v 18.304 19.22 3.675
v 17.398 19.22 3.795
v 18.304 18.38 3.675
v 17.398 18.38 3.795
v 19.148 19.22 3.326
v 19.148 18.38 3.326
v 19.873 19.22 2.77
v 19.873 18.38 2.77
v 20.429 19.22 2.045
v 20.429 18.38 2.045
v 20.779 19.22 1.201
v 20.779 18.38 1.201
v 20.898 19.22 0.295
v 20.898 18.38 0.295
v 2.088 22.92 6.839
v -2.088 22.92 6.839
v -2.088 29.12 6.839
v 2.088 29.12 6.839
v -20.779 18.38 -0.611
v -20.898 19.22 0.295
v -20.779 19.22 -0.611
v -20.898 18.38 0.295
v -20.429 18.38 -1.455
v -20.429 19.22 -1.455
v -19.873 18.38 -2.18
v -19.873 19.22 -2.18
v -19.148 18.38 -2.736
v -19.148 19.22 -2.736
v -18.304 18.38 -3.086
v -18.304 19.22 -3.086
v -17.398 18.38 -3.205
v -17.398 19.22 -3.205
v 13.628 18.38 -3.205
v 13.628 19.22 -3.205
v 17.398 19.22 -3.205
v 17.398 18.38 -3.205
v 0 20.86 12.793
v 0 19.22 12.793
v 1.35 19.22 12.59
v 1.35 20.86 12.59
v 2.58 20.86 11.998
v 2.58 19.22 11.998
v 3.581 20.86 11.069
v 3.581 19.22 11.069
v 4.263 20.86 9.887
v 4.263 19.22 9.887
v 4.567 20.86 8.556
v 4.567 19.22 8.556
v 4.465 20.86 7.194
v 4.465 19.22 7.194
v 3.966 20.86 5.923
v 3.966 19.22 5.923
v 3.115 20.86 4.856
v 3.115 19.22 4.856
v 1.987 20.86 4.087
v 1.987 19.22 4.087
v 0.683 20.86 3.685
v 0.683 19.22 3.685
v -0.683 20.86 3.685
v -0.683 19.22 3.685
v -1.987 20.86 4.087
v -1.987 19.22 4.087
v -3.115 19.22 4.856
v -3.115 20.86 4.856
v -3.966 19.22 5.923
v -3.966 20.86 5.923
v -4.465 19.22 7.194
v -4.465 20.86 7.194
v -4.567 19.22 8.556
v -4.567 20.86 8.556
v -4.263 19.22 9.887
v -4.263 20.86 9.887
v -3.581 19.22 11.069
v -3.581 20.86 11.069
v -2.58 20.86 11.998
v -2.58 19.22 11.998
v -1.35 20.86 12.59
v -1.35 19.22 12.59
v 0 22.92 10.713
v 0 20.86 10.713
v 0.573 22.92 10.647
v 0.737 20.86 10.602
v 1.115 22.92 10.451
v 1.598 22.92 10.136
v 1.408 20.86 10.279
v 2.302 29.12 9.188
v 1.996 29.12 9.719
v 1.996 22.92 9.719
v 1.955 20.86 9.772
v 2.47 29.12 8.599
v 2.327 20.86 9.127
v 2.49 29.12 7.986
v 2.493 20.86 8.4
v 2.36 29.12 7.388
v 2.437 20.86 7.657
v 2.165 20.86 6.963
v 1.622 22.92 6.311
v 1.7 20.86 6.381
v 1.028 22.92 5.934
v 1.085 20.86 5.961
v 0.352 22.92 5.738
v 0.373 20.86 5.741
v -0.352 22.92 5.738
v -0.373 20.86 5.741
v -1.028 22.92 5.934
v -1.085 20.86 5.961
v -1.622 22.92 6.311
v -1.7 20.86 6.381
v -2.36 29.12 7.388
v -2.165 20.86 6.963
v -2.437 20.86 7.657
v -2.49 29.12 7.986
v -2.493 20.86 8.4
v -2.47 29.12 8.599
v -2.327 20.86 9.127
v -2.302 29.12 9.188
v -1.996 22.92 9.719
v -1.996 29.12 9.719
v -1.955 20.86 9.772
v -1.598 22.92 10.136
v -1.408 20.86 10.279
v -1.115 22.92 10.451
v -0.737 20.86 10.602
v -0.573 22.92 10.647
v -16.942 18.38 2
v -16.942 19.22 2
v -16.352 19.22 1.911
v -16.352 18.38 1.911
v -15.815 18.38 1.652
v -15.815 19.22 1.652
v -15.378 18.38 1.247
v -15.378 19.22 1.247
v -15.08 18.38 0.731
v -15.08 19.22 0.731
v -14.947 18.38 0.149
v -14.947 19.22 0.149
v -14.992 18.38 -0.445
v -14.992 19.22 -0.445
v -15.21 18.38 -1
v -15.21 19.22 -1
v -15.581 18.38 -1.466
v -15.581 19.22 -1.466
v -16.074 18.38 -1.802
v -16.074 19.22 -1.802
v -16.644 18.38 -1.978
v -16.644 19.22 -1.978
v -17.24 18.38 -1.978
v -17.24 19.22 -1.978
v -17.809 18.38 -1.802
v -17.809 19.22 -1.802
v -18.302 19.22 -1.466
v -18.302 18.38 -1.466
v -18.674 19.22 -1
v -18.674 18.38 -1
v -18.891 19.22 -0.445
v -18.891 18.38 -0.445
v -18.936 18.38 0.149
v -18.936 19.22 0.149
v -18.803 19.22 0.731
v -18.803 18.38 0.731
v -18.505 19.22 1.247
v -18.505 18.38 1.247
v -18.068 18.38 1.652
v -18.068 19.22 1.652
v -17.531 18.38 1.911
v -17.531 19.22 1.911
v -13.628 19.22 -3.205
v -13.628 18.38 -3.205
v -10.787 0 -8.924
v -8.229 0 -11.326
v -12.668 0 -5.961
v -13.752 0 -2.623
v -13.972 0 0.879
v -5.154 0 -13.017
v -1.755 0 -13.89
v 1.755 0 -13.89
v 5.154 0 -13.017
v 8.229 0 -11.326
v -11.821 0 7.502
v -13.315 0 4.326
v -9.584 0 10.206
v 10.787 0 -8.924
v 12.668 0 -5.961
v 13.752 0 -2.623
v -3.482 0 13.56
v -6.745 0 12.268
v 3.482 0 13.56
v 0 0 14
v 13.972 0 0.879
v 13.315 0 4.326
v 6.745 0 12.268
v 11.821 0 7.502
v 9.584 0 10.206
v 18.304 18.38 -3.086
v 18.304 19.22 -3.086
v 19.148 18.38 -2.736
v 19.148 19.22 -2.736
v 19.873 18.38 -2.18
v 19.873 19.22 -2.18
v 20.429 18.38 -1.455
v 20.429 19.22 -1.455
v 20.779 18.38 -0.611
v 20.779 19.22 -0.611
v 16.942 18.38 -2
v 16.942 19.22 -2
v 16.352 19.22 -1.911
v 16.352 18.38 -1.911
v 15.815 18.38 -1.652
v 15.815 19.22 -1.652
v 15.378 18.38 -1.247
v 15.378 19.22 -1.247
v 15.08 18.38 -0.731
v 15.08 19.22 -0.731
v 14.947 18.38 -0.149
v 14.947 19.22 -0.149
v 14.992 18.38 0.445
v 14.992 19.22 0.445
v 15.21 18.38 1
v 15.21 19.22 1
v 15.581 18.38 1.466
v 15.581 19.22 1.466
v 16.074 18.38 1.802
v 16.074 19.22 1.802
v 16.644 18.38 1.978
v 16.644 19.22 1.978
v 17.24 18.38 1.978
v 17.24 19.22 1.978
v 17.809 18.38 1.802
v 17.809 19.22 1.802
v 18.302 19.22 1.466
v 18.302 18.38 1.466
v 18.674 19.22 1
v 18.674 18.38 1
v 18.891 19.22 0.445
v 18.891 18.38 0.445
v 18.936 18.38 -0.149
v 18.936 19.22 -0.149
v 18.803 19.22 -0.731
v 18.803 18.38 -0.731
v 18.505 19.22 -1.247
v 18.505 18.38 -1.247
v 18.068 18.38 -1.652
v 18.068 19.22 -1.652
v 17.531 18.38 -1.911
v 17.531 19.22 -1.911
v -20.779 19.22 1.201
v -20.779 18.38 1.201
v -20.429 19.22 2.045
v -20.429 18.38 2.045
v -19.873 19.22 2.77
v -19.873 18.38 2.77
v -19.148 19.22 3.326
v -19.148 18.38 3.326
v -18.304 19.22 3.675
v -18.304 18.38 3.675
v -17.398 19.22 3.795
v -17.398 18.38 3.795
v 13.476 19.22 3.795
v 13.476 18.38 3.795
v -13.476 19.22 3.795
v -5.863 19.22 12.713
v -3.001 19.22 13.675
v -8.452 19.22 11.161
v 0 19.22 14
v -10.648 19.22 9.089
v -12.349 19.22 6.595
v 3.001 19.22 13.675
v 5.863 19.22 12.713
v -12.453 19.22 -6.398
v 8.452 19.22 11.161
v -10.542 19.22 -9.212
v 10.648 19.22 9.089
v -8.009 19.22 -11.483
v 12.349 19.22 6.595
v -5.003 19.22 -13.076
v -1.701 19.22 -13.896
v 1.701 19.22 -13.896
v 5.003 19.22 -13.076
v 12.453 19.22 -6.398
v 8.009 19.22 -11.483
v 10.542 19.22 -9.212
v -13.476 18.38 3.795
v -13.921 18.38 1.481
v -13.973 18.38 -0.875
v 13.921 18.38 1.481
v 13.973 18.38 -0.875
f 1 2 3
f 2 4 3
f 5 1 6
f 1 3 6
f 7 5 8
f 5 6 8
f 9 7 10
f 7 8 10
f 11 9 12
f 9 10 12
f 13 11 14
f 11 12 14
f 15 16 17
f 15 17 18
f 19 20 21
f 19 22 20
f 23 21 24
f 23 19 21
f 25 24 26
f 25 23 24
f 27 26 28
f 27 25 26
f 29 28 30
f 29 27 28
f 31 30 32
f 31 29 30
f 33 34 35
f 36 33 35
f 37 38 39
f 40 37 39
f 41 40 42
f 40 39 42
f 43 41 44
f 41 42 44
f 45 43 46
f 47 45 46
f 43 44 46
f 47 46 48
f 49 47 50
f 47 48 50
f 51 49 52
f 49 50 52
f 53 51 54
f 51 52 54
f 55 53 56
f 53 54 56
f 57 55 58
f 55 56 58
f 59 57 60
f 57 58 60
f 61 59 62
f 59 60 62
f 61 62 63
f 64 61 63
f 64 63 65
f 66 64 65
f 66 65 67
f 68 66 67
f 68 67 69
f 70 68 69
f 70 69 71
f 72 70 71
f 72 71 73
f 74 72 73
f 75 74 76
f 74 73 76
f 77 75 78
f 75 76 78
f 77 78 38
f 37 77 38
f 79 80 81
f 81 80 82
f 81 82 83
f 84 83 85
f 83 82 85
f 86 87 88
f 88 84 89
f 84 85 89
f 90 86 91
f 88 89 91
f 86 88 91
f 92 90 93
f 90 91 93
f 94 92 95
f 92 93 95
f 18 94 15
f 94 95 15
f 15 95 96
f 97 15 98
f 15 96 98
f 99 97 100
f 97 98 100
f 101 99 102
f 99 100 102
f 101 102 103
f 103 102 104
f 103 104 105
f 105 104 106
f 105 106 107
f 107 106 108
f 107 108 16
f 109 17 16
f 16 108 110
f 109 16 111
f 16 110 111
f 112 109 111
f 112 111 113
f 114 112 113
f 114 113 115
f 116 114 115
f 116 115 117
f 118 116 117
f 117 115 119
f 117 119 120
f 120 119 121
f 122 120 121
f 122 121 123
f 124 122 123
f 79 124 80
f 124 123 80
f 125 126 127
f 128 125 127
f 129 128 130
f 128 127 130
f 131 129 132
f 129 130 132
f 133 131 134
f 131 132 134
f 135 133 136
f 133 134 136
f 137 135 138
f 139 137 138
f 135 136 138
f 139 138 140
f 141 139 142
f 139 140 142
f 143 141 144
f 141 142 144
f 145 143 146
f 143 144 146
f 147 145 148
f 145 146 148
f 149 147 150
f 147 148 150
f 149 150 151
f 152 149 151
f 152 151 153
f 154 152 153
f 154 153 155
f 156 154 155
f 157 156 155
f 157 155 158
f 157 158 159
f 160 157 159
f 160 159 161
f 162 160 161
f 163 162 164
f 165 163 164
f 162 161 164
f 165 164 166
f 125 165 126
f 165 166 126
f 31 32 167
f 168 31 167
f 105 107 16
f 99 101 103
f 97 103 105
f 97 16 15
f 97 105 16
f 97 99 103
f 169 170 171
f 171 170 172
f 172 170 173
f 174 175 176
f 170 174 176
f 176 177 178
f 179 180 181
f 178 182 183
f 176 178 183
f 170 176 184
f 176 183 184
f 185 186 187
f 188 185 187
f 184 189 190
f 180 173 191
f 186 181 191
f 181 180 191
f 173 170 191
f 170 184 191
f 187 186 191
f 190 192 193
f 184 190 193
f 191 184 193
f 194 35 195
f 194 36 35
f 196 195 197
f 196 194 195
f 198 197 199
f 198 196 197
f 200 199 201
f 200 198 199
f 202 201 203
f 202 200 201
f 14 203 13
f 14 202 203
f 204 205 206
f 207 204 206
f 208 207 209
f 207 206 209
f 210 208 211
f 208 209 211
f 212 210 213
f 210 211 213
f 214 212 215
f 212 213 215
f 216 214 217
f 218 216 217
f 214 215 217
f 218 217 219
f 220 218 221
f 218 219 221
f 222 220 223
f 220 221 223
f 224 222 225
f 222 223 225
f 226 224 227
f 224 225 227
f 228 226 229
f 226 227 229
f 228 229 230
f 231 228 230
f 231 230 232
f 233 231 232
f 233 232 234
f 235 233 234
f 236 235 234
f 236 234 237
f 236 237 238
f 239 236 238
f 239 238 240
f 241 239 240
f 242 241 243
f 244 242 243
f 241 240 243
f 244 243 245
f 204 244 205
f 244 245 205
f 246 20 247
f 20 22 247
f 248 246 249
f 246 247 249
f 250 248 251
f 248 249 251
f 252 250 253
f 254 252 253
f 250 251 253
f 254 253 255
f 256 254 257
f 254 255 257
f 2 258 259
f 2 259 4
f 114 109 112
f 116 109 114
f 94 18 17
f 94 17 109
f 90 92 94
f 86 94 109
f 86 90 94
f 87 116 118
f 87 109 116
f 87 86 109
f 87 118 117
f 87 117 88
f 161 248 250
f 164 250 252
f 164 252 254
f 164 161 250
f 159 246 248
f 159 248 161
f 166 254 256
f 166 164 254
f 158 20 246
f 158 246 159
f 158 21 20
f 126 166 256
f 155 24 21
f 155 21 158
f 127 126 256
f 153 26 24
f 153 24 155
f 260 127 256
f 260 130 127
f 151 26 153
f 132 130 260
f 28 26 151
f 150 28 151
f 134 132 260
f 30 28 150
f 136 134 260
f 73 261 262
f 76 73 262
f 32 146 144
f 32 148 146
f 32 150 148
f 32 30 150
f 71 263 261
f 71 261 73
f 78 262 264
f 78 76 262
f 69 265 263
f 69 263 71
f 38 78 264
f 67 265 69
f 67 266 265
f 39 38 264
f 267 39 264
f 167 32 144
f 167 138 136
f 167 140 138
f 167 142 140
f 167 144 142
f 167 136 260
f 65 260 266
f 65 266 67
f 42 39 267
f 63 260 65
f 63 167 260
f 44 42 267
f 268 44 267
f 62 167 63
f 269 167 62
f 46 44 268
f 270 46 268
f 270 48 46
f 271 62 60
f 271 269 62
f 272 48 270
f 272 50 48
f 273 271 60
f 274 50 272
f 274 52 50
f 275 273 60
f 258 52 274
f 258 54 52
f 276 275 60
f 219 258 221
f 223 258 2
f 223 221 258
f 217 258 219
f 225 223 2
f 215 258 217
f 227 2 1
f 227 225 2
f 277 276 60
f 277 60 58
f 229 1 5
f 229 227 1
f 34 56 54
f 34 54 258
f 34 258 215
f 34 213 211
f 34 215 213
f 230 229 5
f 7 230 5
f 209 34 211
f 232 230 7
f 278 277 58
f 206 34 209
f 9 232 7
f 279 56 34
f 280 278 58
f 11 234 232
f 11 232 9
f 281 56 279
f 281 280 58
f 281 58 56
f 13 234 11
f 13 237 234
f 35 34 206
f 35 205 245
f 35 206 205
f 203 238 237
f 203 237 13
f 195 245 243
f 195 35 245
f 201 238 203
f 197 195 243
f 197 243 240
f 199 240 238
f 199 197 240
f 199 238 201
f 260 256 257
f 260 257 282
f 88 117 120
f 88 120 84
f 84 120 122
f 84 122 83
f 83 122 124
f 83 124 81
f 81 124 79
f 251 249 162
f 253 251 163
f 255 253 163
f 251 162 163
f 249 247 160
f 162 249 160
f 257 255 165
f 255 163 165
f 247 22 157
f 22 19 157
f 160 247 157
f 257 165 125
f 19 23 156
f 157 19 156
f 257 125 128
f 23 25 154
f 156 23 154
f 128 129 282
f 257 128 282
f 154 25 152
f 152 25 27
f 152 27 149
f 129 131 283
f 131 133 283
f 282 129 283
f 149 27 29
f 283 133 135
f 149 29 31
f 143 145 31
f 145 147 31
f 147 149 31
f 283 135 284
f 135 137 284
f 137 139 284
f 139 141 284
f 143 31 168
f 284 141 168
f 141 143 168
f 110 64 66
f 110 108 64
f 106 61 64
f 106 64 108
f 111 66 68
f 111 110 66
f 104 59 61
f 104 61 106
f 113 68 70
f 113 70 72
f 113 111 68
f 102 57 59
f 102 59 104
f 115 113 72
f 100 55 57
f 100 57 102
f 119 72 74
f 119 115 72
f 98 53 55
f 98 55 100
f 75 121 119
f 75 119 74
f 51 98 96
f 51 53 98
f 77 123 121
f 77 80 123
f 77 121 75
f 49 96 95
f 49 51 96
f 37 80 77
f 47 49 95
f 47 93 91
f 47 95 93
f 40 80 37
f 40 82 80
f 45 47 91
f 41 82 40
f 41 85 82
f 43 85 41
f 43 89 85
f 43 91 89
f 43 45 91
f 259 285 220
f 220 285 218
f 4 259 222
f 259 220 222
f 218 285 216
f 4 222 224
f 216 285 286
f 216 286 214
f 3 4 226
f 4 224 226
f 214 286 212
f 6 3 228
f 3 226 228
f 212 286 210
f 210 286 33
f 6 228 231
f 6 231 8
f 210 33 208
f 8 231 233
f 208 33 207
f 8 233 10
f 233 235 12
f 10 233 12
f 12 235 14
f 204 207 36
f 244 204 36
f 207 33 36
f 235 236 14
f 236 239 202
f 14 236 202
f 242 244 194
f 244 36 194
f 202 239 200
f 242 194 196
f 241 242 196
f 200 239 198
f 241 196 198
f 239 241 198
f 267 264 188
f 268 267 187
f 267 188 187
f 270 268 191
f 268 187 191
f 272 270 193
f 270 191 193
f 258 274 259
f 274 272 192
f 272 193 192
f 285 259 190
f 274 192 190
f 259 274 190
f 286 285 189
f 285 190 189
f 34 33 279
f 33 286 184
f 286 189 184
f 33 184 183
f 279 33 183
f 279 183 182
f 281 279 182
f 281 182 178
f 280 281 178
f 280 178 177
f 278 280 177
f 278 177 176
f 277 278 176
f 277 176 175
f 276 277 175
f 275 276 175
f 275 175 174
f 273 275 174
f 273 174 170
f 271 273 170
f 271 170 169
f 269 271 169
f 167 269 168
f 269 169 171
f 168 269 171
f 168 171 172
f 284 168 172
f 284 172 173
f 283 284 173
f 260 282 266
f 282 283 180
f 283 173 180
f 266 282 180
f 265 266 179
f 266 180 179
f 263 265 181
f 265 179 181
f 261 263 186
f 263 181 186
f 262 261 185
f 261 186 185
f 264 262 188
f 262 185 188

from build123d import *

# Parameters (mm, degrees)
SKETCH1_R           = 14
BOSS_EXTRUDE1_DEPTH = 19.22
SKETCH2_W           = 41.795845618
SKETCH2_H           = 7
BOSS_EXTRUDE2_DEPTH = 0.84
FILLET2_R           = 3.5
SKETCH3_R           = 2
CUT_EXTRUDE1_DEPTH  = 0.84
SKETCH4_R           = 4.58
BOSS_EXTRUDE3_DEPTH = 1.64
SKETCH5_R           = 2.5
BOSS_EXTRUDE4_DEPTH = 8.26
SKETCH6_OUTSIDE_W   = 55.422
SKETCH6_OUTSIDE_H   = 41.626
SKETCH6_OUTSIDE_W_2 = 6.15537624
SKETCH6_OUTSIDE_H_2 = 2.88
CUT_EXTRUDE2_DEPTH  = 6.2


with BuildPart() as part:
    # Sketch1 → Boss-Extrude1 (new body)
    with BuildSketch(Plane(origin=(0, 0, 0), x_dir=(1, 0, 0), z_dir=(0, 1, 0))):
        with Locations(Location((0, 0, 0), (0, 0, 270))):
            Circle(SKETCH1_R)
    extrude(amount=BOSS_EXTRUDE1_DEPTH)

    # Sketch2 → Boss-Extrude2 (add)
    with BuildSketch(Plane(origin=(0, 19.22, 0), x_dir=(1, 0, 0), z_dir=(0, 1, 0))):
        with Locations((0, -0.294656178)):
            Rectangle(SKETCH2_W, SKETCH2_H)
    extrude(amount=-BOSS_EXTRUDE2_DEPTH)

    # Fillet2
    fillet2_edges = [part.edges().sort_by_distance(p)[0] for p in [
        (20.897922809, 18.8, -3.205343822),
        (20.897922809, 18.8, 3.794656178),
        (-20.897922809, 18.8, -3.205343822),
        (-20.897922809, 18.8, 3.794656178),
    ]]
    fillet(fillet2_edges, radius=FILLET2_R - 0.0001)  # a hair under: the kernel refuses the full size

    # Sketch3 → Cut-Extrude1 (cut)
    with BuildSketch(Plane(origin=(0, 19.22, 0), x_dir=(1, 0, 0), z_dir=(0, 1, 0))):
        with Locations(Location((-16.94163256, 0, 0), (0, 0, 270))):
            Circle(SKETCH3_R)
        with Locations(Location((16.94163256, 0, 0), (0, 0, 90))):
            Circle(SKETCH3_R)
    extrude(amount=-CUT_EXTRUDE1_DEPTH, mode=Mode.SUBTRACT)

    # Sketch4 → Boss-Extrude3 (add)
    with BuildSketch(Plane(origin=(0, 19.22, 0), x_dir=(1, 0, 0), z_dir=(0, 1, 0))):
        with Locations(Location((0, -8.213475026, 0), (0, 0, 270))):
            Circle(SKETCH4_R)
    extrude(amount=BOSS_EXTRUDE3_DEPTH)

    # Sketch5 → Boss-Extrude4 (add)
    with BuildSketch(Plane(origin=(0, 20.86, 0), x_dir=(1, 0, 0), z_dir=(0, 1, 0))):
        with Locations(Location((0, -8.213475026, 0), (0, 0, 270))):
            Circle(SKETCH5_R)
    extrude(amount=BOSS_EXTRUDE4_DEPTH)

    # Sketch6 outside → Cut-Extrude2 (cut)
    with BuildSketch(Plane(origin=(0, 29.12, 0), x_dir=(1, 0, 0), z_dir=(0, 1, 0))):
        Rectangle(SKETCH6_OUTSIDE_W, SKETCH6_OUTSIDE_H)
        with Locations((0, -8.278567721)):
            Rectangle(SKETCH6_OUTSIDE_W_2, SKETCH6_OUTSIDE_H_2, mode=Mode.SUBTRACT)
    extrude(amount=-CUT_EXTRUDE2_DEPTH, mode=Mode.SUBTRACT)


solid = part.part
